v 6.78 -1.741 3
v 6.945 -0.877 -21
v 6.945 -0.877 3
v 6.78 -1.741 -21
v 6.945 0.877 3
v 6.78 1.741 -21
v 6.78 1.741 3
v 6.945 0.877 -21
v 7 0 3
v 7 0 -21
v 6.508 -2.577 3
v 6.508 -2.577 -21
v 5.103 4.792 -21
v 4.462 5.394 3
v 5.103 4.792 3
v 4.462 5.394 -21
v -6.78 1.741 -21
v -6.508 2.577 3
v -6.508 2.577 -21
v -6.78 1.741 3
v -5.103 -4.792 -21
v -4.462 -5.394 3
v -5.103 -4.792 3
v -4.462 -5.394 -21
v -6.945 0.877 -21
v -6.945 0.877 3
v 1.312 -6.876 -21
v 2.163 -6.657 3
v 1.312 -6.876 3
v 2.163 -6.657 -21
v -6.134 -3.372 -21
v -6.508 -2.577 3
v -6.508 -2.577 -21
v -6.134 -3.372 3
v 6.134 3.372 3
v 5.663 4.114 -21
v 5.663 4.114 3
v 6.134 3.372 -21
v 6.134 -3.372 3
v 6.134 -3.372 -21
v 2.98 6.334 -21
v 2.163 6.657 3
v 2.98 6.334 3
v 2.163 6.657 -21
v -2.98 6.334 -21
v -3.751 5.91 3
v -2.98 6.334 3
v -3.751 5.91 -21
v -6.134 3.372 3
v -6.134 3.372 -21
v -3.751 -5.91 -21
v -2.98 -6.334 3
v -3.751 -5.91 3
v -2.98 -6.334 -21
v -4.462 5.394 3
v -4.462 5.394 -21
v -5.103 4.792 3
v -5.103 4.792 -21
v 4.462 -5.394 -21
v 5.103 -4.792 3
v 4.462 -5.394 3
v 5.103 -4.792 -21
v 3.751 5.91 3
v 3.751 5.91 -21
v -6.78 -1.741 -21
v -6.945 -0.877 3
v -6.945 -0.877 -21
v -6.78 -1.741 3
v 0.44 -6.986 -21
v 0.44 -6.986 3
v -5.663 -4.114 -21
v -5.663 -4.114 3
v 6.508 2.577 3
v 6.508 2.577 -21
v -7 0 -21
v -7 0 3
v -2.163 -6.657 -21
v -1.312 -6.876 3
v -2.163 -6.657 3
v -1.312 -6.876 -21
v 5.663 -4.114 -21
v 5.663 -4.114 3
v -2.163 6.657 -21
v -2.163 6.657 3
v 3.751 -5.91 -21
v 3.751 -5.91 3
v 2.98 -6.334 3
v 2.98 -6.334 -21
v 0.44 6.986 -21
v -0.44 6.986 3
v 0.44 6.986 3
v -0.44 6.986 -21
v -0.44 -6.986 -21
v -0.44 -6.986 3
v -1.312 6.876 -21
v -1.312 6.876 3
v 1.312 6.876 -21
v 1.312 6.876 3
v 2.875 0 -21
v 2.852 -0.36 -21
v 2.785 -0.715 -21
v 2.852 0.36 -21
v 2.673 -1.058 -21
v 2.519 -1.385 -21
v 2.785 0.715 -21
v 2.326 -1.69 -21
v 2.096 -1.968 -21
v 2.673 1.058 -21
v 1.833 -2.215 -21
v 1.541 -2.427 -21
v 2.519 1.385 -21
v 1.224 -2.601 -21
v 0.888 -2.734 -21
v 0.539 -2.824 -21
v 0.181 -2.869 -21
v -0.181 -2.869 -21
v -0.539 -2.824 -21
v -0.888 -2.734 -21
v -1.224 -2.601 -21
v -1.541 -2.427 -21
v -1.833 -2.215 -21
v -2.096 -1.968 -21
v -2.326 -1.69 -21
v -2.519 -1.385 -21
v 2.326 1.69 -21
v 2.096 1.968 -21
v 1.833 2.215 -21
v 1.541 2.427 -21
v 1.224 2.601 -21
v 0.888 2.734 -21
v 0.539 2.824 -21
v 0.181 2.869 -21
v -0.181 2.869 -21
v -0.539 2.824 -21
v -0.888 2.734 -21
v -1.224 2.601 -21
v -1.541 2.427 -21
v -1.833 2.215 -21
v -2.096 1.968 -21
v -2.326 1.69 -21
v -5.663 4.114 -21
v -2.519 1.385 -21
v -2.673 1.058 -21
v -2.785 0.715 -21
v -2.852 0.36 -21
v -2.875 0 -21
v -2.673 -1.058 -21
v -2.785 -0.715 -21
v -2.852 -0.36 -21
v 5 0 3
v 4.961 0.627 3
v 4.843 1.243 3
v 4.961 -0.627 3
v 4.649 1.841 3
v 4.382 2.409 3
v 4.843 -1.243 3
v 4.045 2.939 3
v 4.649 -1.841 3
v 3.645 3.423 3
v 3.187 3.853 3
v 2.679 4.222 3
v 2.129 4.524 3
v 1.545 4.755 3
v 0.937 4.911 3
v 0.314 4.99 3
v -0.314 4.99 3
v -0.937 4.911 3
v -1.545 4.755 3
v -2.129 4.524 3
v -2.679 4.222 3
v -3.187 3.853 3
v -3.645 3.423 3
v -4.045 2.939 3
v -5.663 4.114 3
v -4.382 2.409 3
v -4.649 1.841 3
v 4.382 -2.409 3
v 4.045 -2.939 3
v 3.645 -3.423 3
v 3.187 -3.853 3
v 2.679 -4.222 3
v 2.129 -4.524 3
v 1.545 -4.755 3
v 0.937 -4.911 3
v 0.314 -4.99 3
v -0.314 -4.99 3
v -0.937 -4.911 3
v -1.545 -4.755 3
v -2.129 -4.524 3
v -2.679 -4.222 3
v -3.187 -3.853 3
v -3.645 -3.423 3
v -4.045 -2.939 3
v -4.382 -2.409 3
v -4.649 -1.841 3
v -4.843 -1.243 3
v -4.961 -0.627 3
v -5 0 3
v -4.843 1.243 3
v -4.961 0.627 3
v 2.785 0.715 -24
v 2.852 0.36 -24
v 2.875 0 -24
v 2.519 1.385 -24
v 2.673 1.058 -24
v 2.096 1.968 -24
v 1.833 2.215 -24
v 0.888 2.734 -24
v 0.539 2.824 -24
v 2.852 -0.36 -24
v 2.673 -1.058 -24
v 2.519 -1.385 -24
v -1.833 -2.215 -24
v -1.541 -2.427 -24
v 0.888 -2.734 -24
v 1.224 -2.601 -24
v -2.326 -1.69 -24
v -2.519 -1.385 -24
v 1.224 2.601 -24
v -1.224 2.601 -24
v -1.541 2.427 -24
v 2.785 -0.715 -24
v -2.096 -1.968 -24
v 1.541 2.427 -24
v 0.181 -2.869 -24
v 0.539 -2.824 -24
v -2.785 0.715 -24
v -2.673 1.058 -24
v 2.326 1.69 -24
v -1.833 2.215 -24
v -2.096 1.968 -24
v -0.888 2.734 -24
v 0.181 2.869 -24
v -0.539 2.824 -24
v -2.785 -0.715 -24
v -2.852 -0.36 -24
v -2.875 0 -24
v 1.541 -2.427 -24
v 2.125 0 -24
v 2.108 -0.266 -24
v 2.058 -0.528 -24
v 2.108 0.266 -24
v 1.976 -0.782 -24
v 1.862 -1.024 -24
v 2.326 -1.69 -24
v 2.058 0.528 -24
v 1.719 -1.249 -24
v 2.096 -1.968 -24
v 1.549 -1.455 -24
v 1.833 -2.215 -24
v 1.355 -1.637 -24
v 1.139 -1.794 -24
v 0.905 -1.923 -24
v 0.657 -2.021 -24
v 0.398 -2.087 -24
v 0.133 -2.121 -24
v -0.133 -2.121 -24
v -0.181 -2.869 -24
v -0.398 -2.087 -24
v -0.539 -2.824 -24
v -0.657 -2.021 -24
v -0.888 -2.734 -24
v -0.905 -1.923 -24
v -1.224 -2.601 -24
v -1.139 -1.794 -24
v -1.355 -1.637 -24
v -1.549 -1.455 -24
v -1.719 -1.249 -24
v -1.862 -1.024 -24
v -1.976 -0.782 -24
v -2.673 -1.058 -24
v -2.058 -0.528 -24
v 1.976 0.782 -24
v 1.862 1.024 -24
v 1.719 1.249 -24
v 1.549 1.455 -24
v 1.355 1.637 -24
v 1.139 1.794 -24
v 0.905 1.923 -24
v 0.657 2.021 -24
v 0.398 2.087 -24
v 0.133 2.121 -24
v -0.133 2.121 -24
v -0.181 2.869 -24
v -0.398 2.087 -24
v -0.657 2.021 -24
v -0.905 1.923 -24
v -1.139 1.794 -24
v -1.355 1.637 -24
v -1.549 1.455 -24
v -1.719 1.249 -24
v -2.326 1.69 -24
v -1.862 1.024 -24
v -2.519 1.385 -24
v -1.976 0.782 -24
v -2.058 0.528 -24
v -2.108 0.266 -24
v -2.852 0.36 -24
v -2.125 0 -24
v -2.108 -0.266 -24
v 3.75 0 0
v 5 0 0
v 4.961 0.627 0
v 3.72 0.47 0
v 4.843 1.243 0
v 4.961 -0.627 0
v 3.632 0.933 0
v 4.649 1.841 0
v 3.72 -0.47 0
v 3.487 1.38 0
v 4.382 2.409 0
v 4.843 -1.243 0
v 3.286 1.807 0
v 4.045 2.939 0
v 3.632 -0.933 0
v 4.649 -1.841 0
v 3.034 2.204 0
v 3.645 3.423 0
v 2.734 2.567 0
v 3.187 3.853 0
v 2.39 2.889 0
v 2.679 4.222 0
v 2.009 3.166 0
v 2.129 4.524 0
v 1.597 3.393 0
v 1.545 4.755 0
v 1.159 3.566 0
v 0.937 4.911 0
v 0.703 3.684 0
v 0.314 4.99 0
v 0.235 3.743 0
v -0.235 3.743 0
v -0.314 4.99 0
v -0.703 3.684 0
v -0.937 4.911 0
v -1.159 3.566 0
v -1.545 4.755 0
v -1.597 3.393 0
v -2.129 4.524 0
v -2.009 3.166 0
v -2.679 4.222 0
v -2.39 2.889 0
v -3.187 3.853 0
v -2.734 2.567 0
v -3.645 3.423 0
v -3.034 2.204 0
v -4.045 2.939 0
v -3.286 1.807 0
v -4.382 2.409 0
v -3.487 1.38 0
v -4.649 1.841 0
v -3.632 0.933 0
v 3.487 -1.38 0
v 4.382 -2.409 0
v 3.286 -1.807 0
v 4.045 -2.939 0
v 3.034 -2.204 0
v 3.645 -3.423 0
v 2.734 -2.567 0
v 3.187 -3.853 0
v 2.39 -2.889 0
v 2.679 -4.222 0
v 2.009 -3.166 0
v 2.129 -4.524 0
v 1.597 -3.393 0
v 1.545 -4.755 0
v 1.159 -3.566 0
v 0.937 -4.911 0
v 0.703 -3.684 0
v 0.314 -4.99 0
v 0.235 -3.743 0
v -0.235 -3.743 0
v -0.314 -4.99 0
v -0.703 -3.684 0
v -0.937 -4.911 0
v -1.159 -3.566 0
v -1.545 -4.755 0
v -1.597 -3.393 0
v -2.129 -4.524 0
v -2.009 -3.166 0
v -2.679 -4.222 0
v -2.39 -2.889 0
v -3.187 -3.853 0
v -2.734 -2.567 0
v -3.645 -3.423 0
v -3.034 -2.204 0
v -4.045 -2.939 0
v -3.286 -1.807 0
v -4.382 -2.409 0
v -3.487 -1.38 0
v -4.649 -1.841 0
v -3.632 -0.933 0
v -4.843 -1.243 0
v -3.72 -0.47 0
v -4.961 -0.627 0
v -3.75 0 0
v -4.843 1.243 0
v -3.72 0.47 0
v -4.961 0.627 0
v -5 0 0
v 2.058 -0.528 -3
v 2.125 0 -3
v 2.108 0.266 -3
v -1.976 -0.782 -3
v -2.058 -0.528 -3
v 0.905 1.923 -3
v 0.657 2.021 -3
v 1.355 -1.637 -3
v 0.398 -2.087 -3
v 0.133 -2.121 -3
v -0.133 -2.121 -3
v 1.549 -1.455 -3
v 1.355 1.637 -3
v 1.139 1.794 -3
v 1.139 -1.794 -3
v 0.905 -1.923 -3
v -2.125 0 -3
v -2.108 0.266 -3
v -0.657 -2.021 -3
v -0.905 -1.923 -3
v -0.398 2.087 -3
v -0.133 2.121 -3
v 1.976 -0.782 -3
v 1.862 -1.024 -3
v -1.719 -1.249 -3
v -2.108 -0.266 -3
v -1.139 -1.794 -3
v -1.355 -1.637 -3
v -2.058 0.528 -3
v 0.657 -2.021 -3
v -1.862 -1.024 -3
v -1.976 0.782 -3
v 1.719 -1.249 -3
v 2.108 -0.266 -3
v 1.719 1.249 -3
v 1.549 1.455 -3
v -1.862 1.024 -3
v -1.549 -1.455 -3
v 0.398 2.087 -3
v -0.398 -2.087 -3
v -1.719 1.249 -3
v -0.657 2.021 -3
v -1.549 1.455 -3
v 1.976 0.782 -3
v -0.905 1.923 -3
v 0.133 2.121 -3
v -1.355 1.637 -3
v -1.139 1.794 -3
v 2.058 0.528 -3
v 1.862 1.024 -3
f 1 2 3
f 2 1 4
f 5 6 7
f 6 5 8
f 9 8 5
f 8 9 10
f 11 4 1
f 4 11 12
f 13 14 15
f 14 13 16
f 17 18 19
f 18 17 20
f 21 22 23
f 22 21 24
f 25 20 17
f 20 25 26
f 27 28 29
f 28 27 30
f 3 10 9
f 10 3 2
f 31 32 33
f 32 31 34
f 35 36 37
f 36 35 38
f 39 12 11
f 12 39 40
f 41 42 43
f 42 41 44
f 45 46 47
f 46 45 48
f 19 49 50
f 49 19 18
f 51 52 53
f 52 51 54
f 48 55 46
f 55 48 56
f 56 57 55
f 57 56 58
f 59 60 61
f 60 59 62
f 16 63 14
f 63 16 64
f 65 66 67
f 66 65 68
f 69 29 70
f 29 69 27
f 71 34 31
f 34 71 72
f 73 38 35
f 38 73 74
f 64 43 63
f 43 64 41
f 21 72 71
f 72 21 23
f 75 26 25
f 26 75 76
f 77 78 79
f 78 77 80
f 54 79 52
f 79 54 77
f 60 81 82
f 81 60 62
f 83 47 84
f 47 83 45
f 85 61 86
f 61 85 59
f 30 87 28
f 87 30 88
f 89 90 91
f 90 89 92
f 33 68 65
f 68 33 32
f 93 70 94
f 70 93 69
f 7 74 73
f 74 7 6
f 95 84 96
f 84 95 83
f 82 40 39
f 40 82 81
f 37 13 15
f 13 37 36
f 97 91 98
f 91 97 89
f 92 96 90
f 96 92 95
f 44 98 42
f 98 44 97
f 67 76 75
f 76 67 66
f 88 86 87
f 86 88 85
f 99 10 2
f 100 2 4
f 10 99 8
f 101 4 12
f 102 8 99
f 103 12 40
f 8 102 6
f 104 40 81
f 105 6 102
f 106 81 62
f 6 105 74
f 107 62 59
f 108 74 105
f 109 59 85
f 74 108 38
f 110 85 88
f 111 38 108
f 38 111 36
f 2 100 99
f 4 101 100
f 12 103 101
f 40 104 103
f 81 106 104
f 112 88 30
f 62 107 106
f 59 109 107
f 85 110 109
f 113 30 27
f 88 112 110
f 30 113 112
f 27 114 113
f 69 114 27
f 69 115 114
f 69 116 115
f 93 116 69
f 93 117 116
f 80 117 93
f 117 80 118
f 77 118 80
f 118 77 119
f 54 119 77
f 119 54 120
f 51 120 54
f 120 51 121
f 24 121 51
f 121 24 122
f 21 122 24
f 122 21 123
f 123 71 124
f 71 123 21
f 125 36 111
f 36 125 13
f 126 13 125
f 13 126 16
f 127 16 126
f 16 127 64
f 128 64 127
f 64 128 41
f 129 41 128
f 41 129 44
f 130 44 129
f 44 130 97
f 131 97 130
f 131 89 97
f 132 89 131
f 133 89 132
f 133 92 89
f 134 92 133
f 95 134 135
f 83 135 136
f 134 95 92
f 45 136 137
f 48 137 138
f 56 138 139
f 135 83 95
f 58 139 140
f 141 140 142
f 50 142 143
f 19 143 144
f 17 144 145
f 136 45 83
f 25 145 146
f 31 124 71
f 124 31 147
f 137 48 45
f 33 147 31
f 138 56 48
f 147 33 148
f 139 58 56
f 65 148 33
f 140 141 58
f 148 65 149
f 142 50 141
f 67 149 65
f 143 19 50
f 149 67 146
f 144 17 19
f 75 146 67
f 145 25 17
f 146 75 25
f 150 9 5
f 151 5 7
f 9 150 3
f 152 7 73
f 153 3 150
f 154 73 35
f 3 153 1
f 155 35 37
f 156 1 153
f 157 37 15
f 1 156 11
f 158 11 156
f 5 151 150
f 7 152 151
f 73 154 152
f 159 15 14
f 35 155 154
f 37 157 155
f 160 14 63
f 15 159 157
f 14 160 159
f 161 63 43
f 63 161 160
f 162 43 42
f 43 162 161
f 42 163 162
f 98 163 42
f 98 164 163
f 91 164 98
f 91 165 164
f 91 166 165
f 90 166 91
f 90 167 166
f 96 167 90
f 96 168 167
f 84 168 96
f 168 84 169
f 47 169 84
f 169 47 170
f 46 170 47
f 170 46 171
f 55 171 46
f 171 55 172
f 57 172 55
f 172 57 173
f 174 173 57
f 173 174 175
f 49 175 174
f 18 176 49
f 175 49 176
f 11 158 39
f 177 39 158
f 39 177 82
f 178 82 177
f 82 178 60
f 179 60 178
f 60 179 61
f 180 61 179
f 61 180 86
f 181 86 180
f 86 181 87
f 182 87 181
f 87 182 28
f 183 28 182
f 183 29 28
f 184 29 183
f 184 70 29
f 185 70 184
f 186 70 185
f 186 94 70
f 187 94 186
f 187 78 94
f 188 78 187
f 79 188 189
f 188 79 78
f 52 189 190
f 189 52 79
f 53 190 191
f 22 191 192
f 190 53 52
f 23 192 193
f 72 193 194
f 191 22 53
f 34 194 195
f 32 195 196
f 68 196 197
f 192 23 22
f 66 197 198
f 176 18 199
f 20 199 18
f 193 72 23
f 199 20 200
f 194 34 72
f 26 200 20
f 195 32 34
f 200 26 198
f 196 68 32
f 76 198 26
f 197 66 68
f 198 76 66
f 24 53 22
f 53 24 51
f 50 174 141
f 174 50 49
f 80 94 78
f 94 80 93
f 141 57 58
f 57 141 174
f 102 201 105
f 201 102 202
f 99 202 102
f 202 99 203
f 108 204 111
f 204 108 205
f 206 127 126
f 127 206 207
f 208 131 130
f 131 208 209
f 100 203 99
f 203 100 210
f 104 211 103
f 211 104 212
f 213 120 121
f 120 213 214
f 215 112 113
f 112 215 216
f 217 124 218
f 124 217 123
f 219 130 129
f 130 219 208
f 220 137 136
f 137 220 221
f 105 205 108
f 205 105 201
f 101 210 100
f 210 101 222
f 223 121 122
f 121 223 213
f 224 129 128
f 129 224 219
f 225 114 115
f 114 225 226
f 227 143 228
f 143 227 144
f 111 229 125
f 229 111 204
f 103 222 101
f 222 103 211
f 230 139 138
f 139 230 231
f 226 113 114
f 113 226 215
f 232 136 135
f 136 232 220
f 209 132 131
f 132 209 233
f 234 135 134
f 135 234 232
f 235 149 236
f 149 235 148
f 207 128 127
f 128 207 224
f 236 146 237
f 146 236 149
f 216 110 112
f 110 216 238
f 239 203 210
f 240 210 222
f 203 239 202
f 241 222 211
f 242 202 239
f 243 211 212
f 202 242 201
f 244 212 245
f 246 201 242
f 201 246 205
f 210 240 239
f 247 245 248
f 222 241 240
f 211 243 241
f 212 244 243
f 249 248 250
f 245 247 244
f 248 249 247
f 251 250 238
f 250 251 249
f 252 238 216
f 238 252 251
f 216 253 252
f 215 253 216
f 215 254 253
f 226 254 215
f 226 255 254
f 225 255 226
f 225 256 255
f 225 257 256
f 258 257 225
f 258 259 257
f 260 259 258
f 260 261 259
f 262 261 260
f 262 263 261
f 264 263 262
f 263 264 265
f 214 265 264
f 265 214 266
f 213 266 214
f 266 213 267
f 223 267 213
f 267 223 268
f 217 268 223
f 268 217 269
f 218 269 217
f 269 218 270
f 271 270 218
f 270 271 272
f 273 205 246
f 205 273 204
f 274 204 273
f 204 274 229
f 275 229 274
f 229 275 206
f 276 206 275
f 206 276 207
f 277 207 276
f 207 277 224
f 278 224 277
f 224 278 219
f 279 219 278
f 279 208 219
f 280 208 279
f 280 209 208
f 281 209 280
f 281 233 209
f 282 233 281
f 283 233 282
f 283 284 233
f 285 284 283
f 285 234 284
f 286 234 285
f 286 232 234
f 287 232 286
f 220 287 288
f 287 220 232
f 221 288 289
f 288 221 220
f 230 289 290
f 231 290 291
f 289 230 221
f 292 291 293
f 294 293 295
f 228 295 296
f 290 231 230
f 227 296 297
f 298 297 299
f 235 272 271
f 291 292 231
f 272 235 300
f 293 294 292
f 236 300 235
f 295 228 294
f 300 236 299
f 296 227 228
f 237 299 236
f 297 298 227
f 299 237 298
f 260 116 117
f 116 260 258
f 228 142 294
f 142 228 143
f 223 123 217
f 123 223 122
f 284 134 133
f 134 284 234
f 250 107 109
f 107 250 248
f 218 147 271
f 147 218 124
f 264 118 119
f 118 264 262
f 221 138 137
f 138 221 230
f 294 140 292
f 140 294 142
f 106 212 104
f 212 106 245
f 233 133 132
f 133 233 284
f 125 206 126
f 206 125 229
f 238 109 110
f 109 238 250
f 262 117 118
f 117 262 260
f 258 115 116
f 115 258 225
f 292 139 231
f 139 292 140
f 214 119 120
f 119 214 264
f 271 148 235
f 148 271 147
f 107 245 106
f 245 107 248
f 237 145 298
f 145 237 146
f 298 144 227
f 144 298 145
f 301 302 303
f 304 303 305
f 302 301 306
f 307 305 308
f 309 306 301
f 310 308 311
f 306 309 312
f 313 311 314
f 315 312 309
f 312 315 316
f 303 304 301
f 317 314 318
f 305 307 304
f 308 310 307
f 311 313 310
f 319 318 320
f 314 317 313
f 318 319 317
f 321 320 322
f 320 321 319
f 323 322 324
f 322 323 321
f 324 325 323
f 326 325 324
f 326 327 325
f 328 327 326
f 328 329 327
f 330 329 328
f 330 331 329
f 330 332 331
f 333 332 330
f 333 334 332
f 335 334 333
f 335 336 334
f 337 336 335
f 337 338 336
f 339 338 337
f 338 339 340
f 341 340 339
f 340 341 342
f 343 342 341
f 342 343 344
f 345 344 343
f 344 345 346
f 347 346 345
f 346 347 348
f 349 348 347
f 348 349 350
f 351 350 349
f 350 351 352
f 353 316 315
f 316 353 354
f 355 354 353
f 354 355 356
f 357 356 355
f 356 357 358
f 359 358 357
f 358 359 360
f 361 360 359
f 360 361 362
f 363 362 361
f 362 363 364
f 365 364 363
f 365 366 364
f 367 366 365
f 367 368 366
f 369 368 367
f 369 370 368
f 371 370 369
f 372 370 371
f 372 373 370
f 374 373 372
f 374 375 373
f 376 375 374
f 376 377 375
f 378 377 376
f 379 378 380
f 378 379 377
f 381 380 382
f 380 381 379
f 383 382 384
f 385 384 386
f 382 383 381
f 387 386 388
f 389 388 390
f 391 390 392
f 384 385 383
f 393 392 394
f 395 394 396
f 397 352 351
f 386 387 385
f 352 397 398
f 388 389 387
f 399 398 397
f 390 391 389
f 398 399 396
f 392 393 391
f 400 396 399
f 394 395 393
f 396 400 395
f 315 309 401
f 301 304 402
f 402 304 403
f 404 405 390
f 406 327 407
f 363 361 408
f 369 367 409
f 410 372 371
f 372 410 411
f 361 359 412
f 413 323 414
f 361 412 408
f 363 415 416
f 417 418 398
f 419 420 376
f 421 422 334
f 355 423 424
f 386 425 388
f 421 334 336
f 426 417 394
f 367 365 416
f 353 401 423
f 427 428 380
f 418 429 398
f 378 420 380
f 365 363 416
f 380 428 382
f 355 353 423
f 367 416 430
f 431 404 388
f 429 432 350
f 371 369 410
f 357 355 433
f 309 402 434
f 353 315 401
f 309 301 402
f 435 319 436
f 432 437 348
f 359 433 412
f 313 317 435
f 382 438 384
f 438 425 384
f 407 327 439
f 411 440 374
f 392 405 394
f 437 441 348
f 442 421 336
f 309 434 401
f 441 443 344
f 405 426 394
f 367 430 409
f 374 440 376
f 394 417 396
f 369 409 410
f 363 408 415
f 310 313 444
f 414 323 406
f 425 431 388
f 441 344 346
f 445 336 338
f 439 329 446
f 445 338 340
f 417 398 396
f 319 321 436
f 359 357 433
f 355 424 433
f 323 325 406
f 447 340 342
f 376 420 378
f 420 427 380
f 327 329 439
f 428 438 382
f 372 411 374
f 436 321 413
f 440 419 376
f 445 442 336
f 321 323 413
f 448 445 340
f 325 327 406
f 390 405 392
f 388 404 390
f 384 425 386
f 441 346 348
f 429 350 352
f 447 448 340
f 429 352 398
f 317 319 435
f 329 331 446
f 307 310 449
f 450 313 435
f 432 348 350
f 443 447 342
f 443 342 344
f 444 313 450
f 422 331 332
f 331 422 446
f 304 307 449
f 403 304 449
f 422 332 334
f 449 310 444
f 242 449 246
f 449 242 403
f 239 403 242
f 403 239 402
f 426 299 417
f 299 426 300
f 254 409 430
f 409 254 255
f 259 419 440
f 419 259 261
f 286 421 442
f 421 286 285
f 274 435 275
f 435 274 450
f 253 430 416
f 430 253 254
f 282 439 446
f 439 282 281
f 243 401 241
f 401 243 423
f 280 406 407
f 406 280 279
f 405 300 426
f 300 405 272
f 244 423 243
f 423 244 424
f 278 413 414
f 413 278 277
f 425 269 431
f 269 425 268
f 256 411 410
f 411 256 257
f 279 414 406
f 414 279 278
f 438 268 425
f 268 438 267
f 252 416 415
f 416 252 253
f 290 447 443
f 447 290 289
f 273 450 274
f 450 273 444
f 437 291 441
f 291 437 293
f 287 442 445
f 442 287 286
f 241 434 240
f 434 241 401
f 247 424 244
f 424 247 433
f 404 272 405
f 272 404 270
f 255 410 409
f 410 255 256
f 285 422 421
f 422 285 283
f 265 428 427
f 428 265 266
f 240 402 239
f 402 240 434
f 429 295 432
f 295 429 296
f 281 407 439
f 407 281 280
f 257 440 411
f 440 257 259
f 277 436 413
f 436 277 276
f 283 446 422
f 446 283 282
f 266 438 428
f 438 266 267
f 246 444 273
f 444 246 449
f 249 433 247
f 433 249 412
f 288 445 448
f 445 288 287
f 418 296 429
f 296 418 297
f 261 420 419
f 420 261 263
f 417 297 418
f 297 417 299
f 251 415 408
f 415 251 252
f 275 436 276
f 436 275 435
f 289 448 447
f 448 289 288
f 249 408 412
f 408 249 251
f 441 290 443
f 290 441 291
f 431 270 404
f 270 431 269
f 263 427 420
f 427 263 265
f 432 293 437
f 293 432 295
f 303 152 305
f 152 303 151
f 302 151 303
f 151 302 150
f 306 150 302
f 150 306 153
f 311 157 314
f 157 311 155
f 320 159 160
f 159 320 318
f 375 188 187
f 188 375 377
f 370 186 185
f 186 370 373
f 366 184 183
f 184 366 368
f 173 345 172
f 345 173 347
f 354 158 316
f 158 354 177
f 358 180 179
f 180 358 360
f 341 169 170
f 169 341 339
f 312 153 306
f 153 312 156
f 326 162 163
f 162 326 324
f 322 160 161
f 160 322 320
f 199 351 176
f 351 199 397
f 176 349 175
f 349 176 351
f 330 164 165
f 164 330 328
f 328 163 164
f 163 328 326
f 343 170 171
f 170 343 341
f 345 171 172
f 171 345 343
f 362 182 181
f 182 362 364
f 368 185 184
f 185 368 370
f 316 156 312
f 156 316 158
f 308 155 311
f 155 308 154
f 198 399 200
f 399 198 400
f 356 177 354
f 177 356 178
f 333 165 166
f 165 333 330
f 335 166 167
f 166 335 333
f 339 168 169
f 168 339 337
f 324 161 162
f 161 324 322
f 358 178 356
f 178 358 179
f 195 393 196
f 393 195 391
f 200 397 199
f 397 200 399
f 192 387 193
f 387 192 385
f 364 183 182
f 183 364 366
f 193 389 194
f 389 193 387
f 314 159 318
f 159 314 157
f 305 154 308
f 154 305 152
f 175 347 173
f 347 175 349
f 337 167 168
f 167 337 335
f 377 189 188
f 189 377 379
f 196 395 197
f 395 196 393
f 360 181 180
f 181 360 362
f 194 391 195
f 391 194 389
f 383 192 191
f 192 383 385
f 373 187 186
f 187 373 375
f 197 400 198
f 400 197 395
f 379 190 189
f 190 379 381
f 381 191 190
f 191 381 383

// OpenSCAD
$fn = 50;


difference() {
	union() {
		translate(v = [0, 0, -21.0000000000]) {
			cylinder(h = 24, r = 7.0000000000);
		}
		#translate(v = [0, 0, -24.0000000000]) {
			cylinder(h = 24, r = 2.8750000000);
		}
	}
	union() {
		translate(v = [0, 0, 0]) {
			rotate(a = [0, 0, 0]) {
				difference() {
					union() {
						translate(v = [0, 0, -24.0000000000]) {
							cylinder(h = 24, r = 2.0000000000);
						}
						translate(v = [0, 0, -3]) {
							cylinder(h = 3, r1 = 2.1250000000, r2 = 3.7500000000);
						}
						translate(v = [0, 0, -24.0000000000]) {
							cylinder(h = 24, r = 2.1250000000);
						}
						translate(v = [0, 0, -24.0000000000]) {
							cylinder(h = 24, r = 2.0000000000);
						}
					}
					union();
				}
			}
		}
		#cylinder(h = 3, r = 5.0000000000);
	}
}
